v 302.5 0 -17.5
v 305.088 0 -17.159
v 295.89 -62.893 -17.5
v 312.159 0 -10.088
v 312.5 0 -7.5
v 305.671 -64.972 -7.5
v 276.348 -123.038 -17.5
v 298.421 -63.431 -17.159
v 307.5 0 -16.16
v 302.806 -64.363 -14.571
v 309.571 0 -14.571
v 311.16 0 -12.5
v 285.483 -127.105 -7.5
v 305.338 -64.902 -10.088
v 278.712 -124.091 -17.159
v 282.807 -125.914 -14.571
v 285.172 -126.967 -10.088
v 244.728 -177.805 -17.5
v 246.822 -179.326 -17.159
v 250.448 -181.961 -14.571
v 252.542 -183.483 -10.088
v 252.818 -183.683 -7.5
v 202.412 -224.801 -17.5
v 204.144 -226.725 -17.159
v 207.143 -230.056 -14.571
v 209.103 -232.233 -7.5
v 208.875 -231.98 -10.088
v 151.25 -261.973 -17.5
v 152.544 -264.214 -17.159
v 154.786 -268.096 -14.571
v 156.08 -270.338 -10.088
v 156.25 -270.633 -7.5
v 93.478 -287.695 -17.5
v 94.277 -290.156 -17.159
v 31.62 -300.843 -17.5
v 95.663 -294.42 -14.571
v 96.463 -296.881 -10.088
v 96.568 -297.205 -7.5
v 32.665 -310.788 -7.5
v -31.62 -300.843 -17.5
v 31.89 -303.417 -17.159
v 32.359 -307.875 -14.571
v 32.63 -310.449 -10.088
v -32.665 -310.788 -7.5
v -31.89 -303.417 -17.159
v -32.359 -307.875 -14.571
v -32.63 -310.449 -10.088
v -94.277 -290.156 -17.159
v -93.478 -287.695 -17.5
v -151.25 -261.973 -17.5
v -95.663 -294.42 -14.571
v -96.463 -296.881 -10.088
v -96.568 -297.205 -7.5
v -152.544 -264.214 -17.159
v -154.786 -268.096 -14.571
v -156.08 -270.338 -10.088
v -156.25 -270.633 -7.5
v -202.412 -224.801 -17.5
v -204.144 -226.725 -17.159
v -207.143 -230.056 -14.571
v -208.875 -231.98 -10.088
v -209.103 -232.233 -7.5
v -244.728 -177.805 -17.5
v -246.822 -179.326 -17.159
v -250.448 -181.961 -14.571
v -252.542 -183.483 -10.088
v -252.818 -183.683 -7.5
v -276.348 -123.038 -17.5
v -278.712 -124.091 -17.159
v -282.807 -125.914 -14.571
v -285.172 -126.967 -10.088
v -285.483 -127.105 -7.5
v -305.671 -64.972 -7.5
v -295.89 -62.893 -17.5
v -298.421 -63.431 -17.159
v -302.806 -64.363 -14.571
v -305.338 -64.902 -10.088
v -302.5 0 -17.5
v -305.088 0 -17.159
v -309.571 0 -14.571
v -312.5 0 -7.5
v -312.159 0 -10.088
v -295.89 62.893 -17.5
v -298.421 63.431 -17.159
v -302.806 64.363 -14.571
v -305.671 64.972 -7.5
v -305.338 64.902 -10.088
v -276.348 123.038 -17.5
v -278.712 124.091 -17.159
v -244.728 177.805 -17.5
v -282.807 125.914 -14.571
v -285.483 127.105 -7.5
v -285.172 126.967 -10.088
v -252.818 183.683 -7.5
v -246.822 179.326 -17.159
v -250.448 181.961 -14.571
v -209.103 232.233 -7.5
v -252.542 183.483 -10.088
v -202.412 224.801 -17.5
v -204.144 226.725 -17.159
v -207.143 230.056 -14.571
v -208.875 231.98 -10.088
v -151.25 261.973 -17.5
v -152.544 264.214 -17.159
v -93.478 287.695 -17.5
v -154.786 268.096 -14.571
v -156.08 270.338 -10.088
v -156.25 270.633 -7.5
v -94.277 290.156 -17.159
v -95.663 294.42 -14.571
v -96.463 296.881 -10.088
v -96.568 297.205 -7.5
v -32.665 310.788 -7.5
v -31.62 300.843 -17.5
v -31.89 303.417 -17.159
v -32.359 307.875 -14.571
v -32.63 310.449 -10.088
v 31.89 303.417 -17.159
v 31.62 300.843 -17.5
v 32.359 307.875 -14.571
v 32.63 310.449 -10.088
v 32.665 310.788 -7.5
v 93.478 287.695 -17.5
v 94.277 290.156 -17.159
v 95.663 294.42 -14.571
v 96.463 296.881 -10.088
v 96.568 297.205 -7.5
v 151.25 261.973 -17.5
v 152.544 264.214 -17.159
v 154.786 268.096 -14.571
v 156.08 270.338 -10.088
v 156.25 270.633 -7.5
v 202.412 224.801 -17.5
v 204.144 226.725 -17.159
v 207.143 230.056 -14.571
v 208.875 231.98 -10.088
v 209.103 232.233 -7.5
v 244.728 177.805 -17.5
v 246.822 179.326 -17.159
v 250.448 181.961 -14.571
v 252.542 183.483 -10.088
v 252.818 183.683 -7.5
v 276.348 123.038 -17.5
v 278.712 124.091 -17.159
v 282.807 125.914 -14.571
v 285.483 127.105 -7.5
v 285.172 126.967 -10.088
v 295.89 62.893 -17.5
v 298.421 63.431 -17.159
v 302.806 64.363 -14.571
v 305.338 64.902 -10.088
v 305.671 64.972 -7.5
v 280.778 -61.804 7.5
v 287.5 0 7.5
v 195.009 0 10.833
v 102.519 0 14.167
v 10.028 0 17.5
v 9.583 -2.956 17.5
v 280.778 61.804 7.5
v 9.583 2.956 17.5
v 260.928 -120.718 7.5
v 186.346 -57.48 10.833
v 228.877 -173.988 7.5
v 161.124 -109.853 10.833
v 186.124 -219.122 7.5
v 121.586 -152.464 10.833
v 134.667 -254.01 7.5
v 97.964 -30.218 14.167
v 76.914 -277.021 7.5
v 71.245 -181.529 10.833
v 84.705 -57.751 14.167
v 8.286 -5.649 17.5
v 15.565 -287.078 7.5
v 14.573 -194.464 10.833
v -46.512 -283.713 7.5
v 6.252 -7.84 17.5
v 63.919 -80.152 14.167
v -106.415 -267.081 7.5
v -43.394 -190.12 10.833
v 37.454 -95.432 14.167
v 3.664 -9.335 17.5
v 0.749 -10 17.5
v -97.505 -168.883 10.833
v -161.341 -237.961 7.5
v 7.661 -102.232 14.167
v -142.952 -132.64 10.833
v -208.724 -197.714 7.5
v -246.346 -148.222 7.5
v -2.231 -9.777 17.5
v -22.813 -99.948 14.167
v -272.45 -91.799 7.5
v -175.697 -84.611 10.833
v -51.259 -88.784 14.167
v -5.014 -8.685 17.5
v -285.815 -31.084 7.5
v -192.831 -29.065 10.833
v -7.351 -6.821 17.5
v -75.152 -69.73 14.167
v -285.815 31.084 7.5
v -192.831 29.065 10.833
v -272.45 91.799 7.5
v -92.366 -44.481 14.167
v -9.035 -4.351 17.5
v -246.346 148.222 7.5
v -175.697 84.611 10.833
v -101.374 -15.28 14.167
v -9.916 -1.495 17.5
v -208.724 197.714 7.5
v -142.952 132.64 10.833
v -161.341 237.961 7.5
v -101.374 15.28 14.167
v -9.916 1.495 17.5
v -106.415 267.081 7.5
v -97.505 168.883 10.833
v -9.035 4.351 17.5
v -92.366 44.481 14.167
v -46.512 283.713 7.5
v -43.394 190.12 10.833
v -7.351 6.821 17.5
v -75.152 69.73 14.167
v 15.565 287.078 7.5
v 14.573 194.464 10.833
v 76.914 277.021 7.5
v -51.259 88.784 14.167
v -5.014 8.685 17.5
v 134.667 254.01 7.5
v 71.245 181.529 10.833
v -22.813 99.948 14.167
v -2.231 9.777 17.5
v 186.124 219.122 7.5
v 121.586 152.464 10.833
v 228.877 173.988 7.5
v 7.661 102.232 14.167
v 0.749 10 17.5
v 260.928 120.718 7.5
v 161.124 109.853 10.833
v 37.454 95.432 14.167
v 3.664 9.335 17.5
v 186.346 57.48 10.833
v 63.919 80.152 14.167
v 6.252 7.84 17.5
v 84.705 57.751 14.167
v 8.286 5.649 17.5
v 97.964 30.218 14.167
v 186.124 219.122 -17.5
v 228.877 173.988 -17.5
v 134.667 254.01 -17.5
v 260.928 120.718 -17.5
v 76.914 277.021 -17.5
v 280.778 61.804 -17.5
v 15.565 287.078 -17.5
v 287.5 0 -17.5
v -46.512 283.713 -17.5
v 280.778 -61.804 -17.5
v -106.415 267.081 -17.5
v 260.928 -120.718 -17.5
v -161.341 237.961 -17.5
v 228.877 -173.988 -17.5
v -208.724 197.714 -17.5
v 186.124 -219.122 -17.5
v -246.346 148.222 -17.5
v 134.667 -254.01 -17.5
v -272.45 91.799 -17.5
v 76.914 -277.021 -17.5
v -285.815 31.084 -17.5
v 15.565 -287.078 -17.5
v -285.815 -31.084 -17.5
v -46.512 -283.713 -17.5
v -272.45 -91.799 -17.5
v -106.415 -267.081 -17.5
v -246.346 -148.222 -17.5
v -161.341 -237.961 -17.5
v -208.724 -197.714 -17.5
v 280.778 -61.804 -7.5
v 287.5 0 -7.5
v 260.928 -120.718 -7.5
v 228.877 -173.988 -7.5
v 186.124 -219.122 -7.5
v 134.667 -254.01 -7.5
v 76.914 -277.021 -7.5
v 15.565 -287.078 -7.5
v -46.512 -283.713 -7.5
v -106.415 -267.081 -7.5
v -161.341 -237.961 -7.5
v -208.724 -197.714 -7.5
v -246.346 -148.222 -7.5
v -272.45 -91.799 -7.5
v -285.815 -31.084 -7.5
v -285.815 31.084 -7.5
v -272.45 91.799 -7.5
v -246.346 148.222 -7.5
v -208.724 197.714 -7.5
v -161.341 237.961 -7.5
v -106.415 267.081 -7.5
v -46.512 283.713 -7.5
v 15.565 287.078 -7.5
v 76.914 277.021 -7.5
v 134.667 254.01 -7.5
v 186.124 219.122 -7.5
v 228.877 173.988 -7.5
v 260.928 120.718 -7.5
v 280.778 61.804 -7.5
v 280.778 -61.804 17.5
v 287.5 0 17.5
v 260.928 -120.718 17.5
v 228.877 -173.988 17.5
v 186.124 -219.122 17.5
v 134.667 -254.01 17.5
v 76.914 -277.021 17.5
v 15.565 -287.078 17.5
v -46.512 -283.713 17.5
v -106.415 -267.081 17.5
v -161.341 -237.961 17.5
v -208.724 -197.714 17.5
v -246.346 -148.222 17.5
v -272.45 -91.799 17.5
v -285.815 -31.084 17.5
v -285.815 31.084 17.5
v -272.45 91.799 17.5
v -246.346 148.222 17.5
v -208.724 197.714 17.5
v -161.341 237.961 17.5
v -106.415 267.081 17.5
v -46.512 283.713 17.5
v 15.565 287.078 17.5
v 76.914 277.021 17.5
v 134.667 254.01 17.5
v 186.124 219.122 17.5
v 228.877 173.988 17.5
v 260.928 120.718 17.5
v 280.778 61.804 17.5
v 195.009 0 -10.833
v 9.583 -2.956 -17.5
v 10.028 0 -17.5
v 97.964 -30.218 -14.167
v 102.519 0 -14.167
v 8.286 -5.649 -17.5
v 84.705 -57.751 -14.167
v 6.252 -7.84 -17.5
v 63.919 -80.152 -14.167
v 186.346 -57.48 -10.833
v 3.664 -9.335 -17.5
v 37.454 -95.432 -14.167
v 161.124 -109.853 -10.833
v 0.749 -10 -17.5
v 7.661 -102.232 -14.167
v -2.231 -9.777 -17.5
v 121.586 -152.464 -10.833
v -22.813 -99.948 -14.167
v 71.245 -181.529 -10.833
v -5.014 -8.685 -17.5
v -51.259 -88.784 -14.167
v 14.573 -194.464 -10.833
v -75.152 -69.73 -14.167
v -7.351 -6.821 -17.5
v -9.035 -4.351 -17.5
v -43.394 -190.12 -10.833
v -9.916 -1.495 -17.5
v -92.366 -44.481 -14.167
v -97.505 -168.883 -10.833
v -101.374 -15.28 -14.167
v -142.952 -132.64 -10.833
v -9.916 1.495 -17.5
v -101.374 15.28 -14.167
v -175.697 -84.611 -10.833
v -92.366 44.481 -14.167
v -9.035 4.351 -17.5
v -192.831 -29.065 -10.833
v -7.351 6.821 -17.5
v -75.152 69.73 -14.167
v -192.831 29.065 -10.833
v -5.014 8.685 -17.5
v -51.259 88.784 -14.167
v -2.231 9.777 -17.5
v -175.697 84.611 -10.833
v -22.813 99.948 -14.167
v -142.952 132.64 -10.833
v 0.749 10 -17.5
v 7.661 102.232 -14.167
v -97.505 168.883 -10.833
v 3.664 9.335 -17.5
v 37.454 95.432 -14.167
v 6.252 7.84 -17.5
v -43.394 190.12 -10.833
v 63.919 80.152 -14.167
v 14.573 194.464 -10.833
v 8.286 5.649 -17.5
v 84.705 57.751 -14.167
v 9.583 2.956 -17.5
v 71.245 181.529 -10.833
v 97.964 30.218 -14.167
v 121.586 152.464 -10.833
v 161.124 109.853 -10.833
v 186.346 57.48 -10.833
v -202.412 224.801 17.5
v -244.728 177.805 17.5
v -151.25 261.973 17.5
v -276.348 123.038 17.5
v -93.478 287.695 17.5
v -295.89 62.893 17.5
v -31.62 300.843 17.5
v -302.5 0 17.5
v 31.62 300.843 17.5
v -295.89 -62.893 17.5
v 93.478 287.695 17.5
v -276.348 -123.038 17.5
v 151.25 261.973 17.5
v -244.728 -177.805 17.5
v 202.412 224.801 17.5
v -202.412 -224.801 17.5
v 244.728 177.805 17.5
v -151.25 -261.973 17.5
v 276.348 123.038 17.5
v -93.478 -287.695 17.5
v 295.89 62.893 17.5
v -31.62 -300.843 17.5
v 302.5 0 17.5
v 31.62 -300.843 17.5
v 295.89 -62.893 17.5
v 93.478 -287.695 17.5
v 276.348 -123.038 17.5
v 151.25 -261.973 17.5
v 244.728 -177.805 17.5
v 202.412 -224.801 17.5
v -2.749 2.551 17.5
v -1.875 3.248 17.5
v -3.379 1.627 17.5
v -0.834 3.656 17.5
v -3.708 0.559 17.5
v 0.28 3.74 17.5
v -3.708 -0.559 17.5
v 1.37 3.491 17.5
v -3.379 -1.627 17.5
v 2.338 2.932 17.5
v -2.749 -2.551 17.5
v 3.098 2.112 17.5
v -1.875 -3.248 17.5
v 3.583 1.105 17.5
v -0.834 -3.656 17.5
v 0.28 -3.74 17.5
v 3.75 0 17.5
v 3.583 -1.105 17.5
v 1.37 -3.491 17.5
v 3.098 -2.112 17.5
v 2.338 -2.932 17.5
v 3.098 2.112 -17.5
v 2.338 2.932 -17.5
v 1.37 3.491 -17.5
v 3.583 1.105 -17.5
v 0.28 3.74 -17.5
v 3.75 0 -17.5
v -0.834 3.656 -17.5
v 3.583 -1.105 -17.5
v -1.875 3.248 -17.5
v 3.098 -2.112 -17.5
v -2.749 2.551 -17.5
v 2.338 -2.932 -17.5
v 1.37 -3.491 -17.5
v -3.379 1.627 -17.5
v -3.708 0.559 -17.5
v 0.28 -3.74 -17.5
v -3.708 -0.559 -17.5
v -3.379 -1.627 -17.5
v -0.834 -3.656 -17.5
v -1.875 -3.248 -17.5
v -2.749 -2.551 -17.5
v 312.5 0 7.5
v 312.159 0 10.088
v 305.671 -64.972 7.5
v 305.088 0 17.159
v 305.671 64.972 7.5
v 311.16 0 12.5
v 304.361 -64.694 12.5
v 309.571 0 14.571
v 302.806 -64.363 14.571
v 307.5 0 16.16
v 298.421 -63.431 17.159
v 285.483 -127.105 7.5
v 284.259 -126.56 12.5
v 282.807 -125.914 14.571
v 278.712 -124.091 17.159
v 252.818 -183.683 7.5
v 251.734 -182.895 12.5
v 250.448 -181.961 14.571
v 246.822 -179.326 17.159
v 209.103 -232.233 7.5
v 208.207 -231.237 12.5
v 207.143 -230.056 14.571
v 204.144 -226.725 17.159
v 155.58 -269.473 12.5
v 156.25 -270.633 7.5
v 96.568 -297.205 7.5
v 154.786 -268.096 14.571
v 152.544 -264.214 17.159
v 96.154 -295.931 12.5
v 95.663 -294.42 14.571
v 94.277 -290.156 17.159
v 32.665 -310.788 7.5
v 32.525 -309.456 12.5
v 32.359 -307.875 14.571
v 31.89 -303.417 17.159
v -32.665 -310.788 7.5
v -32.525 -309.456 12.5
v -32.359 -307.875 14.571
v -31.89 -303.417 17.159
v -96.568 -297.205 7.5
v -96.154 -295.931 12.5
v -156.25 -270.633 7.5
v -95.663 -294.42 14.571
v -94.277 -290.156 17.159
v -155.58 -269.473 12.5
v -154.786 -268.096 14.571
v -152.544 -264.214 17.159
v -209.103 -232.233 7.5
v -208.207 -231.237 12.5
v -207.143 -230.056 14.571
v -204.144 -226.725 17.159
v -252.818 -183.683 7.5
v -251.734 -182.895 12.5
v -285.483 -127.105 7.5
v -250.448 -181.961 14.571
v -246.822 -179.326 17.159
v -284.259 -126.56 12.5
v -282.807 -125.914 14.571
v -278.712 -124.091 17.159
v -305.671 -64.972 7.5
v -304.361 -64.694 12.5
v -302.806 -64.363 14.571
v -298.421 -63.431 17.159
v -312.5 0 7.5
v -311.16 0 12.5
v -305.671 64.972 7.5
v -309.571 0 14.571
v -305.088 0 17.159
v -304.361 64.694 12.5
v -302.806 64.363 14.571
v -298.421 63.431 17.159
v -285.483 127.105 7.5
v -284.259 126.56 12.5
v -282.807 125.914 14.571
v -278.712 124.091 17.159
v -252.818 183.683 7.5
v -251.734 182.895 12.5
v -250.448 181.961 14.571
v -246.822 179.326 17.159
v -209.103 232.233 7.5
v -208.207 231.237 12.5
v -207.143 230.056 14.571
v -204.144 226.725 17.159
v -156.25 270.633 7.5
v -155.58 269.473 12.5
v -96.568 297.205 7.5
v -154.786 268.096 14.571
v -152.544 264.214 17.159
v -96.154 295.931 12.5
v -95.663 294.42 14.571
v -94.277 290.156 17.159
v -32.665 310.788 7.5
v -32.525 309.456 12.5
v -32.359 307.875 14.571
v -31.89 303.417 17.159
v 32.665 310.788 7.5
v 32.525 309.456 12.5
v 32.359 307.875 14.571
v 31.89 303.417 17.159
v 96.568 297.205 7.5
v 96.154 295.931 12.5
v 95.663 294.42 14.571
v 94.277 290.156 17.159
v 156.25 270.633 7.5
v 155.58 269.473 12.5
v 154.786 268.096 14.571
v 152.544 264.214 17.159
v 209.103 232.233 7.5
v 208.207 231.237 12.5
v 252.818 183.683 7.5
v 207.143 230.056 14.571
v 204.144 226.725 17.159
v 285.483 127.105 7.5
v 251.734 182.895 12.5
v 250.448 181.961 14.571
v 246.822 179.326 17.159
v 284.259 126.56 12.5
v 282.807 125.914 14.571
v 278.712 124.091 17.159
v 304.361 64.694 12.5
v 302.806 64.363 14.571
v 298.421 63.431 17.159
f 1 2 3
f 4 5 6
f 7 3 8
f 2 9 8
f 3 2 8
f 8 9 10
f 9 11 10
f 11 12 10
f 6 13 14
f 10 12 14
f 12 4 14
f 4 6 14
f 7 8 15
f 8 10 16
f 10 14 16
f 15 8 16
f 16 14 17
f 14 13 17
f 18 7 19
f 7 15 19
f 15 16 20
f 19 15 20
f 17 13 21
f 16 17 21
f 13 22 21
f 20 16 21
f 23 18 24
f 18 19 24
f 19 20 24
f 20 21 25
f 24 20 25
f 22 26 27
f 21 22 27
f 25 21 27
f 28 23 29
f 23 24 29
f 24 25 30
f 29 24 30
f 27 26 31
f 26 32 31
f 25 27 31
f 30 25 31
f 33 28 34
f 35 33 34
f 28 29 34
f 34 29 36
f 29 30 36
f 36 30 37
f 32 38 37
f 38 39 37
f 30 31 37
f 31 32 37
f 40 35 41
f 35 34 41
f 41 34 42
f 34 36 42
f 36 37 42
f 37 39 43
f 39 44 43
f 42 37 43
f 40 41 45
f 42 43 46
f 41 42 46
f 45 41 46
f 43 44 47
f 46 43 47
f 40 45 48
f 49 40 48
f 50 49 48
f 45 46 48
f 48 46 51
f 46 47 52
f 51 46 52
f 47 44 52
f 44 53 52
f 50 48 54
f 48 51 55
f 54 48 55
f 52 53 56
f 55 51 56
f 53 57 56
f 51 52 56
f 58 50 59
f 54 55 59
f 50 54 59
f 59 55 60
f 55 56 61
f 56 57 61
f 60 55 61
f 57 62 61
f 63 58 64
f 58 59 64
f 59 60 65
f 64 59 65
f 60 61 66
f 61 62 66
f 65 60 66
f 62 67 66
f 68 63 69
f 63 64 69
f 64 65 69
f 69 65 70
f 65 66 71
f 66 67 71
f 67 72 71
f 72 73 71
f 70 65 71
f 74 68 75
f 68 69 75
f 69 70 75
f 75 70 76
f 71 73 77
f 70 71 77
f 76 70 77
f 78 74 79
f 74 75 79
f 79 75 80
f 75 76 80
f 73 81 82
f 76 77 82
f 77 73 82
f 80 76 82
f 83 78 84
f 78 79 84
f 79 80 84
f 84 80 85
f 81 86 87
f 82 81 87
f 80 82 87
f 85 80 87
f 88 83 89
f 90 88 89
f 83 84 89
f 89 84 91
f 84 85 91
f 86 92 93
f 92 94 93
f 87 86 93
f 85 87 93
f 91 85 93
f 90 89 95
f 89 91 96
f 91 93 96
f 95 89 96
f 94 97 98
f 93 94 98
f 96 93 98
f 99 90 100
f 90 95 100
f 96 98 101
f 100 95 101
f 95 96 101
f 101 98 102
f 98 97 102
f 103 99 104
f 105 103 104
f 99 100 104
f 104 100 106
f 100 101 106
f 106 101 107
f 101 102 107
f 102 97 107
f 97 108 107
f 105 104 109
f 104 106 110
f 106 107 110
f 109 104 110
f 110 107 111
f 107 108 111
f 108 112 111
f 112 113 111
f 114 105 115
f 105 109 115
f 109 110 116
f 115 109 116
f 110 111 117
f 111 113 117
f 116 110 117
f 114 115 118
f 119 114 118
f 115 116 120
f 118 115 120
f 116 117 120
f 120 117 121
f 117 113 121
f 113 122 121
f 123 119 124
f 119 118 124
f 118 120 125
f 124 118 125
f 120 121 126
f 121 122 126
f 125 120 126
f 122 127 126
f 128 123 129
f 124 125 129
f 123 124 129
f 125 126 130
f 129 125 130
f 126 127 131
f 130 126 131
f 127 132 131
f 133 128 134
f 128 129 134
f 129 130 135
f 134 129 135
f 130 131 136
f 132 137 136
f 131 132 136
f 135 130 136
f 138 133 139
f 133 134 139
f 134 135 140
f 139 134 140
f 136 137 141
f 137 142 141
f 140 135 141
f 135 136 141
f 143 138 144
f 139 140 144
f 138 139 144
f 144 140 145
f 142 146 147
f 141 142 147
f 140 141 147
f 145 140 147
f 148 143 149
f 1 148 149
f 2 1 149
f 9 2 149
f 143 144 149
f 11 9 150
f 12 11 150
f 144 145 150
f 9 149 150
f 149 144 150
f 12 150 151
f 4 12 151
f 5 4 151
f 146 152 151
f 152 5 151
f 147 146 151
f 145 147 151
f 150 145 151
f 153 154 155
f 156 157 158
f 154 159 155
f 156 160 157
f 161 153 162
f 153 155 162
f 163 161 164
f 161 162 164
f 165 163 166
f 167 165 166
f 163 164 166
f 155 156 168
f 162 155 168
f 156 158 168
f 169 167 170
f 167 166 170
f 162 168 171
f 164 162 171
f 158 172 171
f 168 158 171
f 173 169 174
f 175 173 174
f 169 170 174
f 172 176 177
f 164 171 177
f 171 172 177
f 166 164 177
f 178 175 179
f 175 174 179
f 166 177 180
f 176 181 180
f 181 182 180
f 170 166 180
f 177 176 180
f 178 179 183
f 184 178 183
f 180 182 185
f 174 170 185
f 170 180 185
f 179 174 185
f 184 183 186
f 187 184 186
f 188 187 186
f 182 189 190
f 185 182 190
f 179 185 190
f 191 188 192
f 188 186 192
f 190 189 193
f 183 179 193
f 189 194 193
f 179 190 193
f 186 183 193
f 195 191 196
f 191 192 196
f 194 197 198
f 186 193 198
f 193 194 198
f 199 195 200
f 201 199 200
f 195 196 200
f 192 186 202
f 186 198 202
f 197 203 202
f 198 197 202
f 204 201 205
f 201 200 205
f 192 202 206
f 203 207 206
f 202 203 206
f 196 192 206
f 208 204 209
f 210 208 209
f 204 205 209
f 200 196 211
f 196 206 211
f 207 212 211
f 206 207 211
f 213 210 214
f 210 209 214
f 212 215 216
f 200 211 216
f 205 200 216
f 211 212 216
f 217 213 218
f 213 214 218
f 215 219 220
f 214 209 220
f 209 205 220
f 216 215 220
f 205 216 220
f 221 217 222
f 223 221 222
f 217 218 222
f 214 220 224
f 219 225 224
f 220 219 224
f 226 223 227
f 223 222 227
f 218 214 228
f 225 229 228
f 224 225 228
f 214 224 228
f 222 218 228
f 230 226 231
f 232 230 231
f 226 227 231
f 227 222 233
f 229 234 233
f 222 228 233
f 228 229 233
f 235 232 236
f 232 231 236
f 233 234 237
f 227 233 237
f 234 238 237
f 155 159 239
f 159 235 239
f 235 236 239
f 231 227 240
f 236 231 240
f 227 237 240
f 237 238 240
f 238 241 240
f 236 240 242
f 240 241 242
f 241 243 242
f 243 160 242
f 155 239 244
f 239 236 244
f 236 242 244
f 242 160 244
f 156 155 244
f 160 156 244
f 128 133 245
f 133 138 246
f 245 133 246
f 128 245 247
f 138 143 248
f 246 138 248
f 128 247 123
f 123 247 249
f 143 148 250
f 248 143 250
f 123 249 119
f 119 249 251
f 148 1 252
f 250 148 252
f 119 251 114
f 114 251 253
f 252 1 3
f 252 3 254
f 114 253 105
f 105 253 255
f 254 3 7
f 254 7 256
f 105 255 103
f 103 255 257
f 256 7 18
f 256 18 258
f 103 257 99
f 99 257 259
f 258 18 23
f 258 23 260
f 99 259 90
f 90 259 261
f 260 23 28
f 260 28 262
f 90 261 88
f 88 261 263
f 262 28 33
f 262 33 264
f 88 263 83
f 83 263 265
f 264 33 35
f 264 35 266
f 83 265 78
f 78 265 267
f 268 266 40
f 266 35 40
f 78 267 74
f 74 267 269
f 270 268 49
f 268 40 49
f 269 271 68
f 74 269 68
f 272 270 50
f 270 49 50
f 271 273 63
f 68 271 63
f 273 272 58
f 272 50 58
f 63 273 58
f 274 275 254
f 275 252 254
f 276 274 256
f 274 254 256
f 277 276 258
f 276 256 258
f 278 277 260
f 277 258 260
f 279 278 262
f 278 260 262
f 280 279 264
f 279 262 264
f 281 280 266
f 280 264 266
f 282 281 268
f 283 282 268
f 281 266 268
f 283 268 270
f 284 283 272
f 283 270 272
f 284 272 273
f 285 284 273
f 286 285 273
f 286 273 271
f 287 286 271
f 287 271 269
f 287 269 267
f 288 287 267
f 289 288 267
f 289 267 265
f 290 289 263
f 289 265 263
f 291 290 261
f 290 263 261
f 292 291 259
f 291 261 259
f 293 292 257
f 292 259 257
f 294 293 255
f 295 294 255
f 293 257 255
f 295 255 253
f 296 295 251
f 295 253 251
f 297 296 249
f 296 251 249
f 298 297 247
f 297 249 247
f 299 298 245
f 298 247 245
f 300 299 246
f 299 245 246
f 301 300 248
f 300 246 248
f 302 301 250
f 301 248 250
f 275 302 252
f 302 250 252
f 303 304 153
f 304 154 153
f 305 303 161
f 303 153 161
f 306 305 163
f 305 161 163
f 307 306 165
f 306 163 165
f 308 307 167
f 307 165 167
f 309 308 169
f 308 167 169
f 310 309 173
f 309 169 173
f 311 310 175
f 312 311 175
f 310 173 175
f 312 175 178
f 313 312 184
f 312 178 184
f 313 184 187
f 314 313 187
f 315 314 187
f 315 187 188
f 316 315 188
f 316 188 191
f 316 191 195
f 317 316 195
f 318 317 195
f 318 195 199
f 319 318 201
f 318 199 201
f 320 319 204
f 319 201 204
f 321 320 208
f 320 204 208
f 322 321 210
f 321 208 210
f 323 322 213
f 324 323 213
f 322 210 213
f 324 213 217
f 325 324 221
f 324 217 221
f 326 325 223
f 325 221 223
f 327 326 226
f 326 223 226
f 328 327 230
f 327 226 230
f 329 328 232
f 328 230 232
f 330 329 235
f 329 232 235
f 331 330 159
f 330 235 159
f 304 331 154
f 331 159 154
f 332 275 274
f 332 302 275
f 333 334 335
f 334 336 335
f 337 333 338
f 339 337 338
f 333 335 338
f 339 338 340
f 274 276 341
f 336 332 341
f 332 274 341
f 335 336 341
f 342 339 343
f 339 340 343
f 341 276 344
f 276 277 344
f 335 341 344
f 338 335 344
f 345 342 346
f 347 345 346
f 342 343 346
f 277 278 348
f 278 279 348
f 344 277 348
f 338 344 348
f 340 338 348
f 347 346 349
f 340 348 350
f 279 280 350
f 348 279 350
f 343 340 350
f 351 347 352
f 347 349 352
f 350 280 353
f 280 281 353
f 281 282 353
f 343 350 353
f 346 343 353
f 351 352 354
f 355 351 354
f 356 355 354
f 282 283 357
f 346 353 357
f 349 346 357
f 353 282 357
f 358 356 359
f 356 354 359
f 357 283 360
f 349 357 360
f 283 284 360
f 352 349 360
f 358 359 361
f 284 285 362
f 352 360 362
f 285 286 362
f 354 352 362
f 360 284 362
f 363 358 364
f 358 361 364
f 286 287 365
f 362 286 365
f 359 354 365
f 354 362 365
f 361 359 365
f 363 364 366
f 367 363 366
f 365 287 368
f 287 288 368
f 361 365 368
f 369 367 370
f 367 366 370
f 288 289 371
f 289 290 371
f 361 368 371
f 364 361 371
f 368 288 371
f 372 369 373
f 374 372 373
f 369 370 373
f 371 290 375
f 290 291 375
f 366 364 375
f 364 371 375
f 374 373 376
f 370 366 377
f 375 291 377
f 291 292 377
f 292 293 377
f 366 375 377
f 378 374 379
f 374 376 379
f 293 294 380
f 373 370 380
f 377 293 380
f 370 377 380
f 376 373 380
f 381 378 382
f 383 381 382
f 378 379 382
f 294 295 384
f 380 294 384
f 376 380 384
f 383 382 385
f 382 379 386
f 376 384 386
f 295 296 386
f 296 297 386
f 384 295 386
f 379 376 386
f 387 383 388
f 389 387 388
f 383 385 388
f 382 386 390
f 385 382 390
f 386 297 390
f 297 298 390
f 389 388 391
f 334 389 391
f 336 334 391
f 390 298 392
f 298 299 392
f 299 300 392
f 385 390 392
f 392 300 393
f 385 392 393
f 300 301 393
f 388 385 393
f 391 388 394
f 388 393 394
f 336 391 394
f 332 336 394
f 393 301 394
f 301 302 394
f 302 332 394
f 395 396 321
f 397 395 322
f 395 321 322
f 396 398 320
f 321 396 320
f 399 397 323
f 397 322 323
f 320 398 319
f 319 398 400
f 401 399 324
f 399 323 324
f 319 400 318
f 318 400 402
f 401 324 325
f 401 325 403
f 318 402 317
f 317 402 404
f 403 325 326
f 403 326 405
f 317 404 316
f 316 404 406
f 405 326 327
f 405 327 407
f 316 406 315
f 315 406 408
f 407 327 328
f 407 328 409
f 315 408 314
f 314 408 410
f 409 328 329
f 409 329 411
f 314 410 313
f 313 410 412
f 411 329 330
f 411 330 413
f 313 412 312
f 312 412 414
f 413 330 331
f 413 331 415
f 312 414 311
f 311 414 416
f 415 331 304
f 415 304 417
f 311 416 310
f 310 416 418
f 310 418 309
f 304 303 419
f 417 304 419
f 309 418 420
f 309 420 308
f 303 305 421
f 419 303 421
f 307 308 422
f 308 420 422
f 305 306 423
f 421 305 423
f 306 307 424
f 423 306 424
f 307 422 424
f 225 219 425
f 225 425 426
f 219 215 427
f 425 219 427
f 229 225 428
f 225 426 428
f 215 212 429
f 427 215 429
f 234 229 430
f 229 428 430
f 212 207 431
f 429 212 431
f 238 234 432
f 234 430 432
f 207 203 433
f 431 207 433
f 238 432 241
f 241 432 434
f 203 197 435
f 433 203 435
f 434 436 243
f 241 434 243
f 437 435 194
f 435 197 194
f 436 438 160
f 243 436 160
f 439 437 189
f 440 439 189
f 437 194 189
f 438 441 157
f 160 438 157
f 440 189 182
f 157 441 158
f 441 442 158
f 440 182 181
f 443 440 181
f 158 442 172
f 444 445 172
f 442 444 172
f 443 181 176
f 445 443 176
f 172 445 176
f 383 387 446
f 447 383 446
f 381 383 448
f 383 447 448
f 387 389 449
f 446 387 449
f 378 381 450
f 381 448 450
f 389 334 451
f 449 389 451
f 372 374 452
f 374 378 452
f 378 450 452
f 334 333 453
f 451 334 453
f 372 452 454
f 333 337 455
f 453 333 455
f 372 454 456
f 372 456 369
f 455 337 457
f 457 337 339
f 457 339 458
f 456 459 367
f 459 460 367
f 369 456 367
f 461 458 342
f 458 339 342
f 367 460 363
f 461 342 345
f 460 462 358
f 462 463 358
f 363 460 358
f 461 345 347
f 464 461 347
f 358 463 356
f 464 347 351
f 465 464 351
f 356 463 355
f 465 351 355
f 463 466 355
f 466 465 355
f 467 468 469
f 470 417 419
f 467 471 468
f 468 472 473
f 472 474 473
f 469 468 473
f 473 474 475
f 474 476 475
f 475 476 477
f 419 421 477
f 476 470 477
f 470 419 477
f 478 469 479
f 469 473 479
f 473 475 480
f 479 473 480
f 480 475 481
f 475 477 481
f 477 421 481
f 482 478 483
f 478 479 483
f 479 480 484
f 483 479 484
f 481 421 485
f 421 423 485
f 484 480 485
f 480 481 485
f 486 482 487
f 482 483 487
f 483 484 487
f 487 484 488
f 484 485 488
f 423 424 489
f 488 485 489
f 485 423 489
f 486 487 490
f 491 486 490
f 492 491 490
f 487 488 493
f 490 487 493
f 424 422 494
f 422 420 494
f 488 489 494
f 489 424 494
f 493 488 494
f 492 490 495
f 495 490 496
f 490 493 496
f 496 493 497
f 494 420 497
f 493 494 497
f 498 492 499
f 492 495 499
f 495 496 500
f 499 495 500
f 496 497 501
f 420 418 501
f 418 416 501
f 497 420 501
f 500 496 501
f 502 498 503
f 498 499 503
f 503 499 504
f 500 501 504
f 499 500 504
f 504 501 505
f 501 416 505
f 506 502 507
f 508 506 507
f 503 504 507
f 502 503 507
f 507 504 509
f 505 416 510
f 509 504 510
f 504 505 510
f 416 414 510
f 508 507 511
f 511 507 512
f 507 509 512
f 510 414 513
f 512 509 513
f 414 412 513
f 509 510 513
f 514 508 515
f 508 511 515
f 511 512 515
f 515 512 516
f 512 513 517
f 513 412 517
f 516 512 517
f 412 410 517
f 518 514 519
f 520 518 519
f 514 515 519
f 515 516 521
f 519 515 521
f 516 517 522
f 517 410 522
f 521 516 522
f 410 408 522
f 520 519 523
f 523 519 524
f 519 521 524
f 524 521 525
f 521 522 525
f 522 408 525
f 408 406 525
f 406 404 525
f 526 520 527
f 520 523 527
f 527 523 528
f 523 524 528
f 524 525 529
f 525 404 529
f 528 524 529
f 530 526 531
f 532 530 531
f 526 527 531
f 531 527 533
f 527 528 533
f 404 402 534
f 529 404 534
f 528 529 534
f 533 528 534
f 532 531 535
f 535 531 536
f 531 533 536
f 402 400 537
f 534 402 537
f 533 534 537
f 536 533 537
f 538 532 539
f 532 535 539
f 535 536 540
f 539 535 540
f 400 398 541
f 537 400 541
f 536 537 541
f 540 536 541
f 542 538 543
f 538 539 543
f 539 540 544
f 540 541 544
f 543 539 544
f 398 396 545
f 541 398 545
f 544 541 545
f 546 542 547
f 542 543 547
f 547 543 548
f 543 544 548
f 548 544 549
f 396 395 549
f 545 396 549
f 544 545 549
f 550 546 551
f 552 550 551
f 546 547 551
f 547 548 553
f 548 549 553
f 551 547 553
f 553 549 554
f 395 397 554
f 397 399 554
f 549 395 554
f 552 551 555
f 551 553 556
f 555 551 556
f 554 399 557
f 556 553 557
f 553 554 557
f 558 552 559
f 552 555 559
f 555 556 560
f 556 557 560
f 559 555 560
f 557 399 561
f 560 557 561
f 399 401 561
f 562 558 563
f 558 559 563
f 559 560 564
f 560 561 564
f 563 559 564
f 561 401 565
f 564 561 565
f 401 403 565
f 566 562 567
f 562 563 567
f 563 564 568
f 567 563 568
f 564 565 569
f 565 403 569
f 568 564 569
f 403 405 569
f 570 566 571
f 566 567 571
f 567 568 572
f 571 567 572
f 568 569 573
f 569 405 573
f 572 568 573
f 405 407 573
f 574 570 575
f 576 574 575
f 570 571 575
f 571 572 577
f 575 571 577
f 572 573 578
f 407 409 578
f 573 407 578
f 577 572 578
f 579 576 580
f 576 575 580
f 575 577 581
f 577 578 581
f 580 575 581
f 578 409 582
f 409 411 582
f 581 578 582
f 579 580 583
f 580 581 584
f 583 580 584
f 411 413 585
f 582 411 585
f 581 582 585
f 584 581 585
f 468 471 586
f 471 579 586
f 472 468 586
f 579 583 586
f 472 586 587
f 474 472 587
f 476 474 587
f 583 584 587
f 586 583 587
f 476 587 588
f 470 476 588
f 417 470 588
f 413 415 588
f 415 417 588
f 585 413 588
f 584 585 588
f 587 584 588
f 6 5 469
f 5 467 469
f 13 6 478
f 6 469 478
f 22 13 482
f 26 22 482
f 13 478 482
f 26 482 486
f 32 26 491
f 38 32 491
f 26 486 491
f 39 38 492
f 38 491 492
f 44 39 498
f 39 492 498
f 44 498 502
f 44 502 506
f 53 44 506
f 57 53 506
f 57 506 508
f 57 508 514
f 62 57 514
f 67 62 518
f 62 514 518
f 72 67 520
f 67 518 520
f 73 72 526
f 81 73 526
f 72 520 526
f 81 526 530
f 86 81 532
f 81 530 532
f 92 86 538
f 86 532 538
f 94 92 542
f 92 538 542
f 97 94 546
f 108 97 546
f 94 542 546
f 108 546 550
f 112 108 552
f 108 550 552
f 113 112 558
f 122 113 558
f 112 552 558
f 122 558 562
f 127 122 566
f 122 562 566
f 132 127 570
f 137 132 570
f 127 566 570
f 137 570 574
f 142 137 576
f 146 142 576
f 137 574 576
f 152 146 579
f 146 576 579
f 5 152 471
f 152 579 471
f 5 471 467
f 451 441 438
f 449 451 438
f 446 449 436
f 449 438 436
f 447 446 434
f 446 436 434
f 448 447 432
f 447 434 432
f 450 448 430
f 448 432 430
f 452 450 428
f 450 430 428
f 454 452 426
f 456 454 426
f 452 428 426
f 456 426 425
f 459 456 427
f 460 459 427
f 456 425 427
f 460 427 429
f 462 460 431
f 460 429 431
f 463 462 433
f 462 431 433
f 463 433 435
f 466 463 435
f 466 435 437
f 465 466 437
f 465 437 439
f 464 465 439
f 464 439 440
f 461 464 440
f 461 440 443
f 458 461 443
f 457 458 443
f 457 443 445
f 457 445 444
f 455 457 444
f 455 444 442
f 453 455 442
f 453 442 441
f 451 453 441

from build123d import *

# Parameters (mm, degrees)
SKETCH5_R          = 3.75
CUT_EXTRUDE1_DEPTH = 72


with BuildPart() as part:
    # Sketch3 → Revolve2 (revolve)
    with BuildSketch(Plane(origin=(0, 0, 0), x_dir=(1, 0, 0), z_dir=(0, 1, 0))):
        with BuildLine():
            Line((287.5, 17.5), (302.5, 17.5))
            ThreePointArc((302.5, 17.5), (309.571067812, 14.571067812), (312.5, 7.5))
            Line((312.5, 7.5), (312.5, -7.5))
            ThreePointArc((312.5, -7.5), (309.571067812, -14.571067812), (302.5, -17.5))
            Line((302.5, -17.5), (287.5, -17.5))
            Line((287.5, -17.5), (287.5, -7.5))
            Line((287.5, -7.5), (10.028182078, -17.5))
            Line((10.028182078, -17.5), (0, -17.5))
            Line((0, -17.5), (0, 17.5))
            Line((0, 17.5), (10.028182078, 17.5))
            Line((10.028182078, 17.5), (287.5, 7.5))
            Line((287.5, 7.5), (287.5, 17.5))
        make_face()
    revolve(axis=Axis((0, 0, 17.5), (0, 0, -1)))

    # Sketch5 → Cut-Extrude1 (cut)
    with BuildSketch(Plane.XY.offset(17.5)):
        Circle(SKETCH5_R)
    extrude(amount=-CUT_EXTRUDE1_DEPTH, mode=Mode.SUBTRACT)


solid = part.part
